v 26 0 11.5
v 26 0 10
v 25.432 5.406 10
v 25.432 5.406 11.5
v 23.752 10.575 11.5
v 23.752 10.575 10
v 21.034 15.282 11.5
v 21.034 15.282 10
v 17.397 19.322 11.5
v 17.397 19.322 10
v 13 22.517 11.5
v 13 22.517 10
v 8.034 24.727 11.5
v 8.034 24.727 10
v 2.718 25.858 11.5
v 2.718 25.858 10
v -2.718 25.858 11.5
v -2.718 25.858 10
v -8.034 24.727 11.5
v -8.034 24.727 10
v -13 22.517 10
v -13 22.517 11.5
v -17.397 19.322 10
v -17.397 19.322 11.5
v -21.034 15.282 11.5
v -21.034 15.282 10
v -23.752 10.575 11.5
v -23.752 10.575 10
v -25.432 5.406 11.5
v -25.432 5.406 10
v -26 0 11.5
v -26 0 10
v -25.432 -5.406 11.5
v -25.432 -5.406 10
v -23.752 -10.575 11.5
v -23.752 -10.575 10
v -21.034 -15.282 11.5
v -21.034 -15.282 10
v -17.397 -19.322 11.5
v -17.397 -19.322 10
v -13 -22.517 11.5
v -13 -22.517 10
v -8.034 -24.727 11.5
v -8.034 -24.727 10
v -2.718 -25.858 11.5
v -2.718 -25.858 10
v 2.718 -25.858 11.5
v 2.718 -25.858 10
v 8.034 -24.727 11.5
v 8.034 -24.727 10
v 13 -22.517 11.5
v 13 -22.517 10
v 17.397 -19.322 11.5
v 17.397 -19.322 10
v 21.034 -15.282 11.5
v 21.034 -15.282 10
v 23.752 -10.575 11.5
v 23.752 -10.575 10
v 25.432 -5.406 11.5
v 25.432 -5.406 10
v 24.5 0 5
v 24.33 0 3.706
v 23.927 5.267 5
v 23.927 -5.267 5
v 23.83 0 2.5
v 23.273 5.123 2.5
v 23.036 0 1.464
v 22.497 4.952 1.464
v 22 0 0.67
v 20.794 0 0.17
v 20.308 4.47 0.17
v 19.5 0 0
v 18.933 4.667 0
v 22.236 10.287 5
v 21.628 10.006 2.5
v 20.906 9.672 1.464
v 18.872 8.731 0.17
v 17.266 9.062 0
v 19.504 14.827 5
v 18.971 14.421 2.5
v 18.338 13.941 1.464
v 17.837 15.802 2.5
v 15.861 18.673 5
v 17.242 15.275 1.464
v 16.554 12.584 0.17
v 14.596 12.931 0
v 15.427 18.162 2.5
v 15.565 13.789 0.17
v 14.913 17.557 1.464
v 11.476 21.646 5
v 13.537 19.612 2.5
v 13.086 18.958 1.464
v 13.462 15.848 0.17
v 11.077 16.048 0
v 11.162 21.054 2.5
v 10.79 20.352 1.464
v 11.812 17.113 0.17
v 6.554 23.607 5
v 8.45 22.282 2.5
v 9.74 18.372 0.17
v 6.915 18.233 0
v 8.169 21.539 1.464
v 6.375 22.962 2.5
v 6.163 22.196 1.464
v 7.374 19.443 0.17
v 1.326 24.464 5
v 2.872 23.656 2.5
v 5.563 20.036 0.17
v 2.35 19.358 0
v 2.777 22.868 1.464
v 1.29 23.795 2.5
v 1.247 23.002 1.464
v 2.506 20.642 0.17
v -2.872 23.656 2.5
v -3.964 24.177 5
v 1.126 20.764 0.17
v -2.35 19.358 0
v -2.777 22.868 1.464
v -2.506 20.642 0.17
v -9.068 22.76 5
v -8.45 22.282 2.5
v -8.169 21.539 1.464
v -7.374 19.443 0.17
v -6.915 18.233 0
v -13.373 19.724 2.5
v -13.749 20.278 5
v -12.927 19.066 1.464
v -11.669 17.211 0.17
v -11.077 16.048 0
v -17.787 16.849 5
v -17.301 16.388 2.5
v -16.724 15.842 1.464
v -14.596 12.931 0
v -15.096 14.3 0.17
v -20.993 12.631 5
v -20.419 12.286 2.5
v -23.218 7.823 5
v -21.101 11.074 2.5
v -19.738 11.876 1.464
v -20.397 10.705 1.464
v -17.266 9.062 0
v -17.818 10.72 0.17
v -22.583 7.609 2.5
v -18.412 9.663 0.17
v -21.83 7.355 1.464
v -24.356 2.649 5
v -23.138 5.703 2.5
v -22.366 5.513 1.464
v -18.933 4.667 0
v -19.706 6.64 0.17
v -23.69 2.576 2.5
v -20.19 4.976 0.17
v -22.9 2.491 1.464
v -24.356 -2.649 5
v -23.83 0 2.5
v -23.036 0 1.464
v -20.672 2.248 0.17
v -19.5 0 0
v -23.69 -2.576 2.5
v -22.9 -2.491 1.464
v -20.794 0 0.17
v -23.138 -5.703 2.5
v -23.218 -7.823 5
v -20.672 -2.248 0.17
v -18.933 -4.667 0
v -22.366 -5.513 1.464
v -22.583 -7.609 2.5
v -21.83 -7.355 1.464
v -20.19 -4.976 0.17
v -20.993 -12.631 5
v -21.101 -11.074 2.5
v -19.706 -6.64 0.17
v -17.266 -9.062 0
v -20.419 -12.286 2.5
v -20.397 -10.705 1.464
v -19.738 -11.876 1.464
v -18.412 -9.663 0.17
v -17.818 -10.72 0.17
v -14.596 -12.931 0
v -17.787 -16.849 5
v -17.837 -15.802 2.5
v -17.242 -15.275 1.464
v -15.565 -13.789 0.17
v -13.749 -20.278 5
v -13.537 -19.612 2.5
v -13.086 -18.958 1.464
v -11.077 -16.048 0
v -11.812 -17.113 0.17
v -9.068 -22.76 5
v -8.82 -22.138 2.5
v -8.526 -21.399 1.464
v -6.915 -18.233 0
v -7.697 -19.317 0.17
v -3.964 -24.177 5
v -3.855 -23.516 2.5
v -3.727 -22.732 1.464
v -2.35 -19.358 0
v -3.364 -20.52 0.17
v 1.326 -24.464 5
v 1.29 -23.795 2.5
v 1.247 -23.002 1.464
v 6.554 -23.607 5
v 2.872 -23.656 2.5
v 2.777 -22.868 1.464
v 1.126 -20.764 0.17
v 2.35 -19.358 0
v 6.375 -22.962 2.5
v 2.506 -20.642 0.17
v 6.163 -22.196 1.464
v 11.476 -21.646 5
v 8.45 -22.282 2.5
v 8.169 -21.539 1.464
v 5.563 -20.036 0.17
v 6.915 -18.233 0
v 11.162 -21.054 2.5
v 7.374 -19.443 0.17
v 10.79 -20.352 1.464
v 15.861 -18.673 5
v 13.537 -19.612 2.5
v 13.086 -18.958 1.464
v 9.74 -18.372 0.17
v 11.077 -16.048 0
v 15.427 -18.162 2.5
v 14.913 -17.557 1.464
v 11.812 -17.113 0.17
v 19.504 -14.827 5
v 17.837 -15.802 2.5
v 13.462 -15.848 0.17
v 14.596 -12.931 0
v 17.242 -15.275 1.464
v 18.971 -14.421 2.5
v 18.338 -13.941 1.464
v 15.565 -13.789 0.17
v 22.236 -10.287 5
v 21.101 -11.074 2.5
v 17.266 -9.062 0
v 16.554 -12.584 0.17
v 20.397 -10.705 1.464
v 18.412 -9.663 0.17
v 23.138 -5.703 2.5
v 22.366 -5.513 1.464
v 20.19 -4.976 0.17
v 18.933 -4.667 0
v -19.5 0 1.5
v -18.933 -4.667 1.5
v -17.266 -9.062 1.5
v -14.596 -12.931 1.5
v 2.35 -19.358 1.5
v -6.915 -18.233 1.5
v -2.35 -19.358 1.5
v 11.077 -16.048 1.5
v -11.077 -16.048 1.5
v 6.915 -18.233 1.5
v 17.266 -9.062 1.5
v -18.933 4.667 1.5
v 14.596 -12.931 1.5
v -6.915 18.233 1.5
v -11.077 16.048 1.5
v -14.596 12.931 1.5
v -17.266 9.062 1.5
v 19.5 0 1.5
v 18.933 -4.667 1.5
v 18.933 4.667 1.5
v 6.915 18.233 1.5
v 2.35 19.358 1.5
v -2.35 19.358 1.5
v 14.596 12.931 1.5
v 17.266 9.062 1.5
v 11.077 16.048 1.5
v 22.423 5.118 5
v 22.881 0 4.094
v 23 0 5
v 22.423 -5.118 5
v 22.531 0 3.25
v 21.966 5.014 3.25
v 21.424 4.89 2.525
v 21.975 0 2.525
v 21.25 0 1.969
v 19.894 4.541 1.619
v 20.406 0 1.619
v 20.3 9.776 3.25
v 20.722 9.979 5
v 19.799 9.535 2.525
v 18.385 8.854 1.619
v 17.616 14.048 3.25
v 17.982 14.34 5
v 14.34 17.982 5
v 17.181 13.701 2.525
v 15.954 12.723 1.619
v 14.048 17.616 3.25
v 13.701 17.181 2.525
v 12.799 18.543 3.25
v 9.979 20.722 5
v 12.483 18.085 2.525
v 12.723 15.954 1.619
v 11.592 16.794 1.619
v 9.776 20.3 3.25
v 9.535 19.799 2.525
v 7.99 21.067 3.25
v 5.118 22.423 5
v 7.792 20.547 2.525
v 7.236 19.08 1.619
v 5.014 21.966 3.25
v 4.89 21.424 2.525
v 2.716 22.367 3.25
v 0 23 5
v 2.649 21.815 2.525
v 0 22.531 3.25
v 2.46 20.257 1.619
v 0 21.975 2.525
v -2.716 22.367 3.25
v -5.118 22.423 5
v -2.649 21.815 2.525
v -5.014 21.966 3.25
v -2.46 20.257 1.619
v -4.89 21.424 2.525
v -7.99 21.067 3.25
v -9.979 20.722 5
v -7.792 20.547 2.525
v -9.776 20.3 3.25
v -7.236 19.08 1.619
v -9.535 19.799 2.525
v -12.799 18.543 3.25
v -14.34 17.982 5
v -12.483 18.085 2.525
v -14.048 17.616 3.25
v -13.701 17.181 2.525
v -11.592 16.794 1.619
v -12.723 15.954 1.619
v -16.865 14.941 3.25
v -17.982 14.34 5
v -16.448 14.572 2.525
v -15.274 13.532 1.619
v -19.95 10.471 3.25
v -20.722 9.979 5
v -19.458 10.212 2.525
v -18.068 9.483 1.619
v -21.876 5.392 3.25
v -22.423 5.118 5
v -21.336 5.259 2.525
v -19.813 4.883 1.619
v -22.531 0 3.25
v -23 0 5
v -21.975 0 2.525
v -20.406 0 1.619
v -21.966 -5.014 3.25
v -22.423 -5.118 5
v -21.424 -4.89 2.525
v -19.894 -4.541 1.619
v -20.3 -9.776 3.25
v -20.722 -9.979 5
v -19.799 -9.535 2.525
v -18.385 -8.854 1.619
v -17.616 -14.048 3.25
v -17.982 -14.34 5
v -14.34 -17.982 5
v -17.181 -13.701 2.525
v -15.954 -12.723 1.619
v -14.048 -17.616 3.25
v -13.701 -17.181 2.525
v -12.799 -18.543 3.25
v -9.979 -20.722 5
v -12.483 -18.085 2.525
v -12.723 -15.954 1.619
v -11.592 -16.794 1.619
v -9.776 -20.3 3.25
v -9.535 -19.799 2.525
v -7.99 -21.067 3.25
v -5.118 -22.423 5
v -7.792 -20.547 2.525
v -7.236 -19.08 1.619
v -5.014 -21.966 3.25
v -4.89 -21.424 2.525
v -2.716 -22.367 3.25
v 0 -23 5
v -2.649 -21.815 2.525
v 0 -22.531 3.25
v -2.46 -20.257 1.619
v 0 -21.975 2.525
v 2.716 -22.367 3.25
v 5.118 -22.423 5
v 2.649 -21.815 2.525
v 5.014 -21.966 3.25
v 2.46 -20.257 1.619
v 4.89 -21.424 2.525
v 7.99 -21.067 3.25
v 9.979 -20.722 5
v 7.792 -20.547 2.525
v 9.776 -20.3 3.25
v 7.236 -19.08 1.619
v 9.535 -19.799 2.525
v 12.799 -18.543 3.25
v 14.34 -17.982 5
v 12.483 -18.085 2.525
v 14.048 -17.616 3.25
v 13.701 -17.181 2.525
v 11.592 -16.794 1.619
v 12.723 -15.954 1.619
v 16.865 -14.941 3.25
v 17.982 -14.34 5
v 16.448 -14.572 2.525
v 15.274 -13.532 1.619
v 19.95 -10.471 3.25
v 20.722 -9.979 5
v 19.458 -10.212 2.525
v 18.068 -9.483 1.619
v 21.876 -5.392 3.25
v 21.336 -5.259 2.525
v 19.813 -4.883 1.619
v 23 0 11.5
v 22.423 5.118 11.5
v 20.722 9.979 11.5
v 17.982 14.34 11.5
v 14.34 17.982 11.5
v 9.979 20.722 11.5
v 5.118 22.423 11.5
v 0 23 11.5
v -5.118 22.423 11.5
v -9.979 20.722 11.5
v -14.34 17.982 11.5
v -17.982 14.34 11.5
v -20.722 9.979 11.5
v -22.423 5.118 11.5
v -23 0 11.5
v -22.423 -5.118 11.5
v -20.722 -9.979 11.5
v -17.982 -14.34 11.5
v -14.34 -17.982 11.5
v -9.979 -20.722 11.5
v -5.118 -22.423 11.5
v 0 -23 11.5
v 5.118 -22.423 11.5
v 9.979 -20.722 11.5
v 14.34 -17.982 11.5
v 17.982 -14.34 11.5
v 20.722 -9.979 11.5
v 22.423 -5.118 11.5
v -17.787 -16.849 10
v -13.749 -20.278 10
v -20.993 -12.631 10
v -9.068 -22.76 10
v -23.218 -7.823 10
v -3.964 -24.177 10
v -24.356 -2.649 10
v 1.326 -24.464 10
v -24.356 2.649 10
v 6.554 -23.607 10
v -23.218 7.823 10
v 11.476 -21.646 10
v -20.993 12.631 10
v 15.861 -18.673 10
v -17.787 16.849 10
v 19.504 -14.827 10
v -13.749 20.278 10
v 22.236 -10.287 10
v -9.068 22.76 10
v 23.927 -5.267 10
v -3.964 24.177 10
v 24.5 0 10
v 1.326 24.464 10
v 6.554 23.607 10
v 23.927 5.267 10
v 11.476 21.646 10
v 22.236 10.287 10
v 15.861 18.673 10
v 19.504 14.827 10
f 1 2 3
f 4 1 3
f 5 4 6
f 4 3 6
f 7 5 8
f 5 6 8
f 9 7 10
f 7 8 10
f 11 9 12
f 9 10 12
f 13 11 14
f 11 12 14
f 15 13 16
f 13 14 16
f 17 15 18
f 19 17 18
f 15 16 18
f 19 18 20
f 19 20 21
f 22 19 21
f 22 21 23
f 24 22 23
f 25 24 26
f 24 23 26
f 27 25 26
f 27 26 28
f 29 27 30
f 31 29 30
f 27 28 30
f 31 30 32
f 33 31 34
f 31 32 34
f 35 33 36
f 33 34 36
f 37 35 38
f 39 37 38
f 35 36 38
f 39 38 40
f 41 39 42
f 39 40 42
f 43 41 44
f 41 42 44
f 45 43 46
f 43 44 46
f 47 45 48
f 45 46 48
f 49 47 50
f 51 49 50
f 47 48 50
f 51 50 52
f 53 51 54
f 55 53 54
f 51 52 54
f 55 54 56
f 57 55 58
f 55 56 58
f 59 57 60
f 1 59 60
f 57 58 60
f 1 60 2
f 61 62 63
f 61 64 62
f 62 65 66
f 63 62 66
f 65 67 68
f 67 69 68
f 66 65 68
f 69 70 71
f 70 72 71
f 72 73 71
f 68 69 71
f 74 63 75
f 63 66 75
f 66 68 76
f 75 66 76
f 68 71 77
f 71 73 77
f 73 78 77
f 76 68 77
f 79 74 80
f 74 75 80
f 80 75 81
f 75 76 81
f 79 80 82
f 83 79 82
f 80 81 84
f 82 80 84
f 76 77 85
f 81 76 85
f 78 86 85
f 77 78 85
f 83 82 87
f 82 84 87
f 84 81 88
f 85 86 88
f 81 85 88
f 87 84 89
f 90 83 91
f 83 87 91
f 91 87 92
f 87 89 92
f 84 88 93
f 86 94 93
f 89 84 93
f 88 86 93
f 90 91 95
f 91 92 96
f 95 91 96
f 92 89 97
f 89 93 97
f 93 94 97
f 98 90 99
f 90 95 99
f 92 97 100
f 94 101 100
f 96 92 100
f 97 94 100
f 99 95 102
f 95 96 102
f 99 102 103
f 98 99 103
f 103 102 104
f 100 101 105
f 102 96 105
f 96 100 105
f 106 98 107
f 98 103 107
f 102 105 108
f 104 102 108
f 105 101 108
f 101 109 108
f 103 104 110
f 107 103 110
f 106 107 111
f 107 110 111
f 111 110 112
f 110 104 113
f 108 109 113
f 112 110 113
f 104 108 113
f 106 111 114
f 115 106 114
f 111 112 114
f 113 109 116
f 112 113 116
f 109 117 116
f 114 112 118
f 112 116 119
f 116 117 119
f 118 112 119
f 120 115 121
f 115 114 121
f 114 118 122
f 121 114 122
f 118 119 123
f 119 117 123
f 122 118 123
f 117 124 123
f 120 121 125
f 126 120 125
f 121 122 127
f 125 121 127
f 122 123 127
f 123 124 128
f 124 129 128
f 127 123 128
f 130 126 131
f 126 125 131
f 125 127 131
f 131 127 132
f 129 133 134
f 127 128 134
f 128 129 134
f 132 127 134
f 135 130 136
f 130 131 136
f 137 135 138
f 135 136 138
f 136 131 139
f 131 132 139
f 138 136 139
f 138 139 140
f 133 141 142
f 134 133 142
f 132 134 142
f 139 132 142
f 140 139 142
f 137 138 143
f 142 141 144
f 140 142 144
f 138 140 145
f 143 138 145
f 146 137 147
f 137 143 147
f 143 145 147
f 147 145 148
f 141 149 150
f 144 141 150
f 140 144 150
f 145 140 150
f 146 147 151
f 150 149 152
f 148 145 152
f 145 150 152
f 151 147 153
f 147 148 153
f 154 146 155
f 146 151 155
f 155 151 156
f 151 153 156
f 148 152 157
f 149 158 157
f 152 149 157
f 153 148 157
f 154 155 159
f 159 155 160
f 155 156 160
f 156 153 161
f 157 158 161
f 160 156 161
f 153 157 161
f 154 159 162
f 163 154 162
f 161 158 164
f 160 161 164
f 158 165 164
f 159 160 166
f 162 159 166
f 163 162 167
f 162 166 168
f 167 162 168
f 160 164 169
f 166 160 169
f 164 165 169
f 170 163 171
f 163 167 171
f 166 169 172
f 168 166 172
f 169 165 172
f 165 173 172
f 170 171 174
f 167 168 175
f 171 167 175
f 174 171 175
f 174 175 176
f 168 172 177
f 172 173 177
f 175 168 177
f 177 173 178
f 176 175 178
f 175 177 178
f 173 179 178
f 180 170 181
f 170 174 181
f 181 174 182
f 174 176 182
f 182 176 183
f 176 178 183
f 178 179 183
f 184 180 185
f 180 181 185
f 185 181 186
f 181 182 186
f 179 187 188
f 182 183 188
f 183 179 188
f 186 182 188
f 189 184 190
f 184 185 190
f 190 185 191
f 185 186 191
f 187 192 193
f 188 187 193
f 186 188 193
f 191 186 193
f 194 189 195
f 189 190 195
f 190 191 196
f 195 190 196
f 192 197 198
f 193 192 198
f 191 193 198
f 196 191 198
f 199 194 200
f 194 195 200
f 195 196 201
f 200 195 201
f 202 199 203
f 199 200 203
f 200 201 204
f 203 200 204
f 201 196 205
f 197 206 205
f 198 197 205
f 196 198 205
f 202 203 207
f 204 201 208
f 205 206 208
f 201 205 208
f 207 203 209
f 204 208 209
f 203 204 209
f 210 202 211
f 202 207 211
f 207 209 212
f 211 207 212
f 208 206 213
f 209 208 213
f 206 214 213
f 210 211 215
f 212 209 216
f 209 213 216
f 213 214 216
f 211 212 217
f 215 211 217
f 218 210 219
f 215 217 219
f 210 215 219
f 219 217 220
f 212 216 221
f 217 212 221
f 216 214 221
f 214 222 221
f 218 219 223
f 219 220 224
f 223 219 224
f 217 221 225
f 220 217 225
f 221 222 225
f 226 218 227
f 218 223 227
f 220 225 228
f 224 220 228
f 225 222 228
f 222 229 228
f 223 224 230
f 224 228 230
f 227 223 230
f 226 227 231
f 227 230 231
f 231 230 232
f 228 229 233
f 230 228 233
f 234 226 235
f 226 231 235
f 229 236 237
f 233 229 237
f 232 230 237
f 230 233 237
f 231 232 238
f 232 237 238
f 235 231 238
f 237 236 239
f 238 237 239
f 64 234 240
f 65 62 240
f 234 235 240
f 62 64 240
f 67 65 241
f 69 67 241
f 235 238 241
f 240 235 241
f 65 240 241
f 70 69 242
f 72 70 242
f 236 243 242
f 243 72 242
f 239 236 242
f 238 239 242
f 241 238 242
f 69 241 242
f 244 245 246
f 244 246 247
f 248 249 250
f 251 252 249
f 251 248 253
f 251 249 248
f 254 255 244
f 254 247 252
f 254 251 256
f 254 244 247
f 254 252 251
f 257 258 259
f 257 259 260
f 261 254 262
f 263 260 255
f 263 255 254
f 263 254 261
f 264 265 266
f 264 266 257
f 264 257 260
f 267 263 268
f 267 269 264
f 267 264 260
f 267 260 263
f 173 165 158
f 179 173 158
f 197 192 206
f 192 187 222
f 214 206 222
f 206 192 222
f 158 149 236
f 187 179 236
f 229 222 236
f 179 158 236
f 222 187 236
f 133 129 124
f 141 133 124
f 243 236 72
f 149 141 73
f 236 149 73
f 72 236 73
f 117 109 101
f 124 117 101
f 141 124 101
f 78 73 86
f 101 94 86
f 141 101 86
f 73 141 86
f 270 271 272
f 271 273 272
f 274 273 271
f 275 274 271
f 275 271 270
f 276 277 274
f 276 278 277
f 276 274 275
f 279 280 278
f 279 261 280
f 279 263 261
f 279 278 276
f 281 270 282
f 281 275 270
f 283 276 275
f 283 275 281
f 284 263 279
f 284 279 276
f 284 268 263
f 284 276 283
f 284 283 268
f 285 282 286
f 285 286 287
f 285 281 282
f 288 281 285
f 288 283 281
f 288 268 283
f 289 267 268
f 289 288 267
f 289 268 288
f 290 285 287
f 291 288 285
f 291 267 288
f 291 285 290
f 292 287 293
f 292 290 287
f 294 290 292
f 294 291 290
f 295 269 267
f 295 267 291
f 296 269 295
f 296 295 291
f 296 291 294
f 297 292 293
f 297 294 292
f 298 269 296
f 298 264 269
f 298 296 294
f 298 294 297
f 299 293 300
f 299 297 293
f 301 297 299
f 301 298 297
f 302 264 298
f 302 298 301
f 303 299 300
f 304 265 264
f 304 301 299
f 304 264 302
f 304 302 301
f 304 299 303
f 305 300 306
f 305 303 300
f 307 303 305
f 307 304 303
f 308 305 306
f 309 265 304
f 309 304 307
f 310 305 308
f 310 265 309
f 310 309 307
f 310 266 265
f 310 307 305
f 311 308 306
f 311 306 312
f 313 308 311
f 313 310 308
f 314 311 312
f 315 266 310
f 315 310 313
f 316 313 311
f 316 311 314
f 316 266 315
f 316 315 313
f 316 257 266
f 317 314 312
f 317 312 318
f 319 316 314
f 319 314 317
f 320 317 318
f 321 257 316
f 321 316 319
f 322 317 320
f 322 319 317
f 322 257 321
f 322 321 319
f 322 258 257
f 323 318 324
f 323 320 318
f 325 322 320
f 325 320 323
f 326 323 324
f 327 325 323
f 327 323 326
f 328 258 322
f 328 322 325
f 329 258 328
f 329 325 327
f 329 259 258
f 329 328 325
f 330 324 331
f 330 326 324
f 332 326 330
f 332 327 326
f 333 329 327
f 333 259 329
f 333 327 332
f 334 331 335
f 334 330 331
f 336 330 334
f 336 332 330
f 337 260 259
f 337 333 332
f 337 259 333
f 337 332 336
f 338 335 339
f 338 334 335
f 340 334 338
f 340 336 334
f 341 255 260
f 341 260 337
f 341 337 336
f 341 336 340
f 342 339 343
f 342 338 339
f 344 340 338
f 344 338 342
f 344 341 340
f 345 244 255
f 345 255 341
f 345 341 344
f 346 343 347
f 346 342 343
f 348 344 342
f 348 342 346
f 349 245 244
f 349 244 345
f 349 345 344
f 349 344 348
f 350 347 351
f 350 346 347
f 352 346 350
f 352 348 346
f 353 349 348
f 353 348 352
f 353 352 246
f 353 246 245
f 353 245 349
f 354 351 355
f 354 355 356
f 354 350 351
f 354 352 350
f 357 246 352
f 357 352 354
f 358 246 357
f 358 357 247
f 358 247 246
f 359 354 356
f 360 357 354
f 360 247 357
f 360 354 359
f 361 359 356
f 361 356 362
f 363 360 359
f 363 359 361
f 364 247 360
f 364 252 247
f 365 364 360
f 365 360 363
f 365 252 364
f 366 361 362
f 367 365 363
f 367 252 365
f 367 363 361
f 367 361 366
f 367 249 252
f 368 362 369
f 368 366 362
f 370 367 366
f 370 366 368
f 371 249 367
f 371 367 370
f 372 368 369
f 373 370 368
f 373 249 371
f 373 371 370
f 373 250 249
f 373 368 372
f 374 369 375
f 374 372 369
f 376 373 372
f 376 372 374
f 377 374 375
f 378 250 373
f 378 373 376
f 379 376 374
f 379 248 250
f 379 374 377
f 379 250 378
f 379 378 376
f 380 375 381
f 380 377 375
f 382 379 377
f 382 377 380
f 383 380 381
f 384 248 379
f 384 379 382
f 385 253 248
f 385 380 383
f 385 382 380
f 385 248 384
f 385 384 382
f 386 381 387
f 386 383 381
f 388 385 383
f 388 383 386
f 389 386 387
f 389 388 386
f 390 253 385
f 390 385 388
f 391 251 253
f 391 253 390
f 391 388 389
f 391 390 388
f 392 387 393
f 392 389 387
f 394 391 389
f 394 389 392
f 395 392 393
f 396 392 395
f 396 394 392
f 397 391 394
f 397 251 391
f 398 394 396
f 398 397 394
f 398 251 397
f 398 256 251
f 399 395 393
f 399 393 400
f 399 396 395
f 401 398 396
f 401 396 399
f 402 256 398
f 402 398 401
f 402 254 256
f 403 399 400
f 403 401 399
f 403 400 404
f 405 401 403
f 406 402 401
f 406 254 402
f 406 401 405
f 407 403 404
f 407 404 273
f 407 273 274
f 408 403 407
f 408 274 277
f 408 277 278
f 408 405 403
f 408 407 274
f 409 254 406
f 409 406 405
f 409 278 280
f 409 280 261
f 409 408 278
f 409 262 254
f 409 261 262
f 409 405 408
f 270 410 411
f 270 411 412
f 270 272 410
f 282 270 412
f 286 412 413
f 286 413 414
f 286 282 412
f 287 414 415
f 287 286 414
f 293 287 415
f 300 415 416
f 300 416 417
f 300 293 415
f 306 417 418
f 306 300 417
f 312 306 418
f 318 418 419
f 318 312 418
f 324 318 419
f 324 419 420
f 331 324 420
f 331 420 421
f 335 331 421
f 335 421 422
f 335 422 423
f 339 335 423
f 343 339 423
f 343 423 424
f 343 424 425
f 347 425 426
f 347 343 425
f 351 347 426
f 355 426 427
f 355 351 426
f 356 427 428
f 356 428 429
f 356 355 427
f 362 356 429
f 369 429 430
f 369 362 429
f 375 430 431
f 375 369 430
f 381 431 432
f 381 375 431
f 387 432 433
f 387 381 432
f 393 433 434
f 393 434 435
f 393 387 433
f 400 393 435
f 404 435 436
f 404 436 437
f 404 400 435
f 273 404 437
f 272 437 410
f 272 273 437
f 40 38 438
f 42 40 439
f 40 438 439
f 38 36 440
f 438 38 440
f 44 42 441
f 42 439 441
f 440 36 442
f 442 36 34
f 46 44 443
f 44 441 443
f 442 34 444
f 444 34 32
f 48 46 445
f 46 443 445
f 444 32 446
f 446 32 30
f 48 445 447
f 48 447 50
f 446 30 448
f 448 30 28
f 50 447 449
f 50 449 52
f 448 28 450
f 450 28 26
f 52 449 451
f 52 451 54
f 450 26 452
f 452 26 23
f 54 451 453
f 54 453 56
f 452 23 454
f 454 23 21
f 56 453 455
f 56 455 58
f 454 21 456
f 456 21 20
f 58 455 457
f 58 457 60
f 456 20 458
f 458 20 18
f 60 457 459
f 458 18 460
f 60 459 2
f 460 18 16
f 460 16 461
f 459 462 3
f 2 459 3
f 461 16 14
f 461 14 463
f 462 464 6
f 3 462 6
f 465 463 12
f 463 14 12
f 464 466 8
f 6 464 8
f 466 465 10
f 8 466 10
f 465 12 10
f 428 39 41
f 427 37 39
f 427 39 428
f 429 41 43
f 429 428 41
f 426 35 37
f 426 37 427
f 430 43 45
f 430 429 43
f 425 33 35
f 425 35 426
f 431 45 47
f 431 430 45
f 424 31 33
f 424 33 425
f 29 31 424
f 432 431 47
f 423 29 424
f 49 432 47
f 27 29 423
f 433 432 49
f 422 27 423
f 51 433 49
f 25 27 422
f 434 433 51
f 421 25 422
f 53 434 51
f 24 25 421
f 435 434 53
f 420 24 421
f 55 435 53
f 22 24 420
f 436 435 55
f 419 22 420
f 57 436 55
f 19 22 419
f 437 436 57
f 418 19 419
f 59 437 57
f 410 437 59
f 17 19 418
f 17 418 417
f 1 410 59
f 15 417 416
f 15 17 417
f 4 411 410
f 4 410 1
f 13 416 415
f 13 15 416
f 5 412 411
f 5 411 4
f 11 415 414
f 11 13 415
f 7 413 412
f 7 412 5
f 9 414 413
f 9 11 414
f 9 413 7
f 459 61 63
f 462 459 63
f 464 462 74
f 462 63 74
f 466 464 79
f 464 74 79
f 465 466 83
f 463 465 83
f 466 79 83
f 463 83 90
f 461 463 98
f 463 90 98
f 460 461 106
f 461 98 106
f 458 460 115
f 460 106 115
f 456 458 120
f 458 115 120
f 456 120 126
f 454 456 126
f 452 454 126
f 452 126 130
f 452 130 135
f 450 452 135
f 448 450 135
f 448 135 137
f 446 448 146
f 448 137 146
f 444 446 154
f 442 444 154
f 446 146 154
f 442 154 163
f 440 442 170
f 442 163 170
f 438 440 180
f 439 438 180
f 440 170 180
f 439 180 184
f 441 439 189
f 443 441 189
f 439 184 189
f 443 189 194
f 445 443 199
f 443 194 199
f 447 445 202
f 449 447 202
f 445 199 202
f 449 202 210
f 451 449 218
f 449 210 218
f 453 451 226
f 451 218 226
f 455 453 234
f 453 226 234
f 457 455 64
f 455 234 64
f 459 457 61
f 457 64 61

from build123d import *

# Parameters (mm, degrees)
SKETCH_R      = 24.5
PAD_DEPTH     = 10
FILLET_R      = 5
THICKNESS_T   = -1.5
SKETCH001_R   = 26
SKETCH001_R_2 = 23
PAD001_DEPTH  = 1.5


with BuildPart() as part:
    # Sketch → Pad (new body)
    with BuildSketch(Plane.XY):
        Circle(SKETCH_R)
    extrude(amount=PAD_DEPTH)

    # Fillet
    fillet_edges = [part.edges().sort_by_distance(p)[0] for p in [
        (-24.5, 0, 0),
    ]]
    fillet(fillet_edges, radius=FILLET_R)

    # Thickness
    thickness_openings = [part.faces().sort_by_distance(p)[0] for p in [
        (0, 0, 10),
    ]]
    offset(amount=THICKNESS_T, openings=thickness_openings)

    # Sketch001 → Pad001 (new body)
    with BuildSketch(Plane.XY.offset(10)):
        Circle(SKETCH001_R)
        Circle(SKETCH001_R_2, mode=Mode.SUBTRACT)
    extrude(amount=PAD001_DEPTH)


solid = part.part
